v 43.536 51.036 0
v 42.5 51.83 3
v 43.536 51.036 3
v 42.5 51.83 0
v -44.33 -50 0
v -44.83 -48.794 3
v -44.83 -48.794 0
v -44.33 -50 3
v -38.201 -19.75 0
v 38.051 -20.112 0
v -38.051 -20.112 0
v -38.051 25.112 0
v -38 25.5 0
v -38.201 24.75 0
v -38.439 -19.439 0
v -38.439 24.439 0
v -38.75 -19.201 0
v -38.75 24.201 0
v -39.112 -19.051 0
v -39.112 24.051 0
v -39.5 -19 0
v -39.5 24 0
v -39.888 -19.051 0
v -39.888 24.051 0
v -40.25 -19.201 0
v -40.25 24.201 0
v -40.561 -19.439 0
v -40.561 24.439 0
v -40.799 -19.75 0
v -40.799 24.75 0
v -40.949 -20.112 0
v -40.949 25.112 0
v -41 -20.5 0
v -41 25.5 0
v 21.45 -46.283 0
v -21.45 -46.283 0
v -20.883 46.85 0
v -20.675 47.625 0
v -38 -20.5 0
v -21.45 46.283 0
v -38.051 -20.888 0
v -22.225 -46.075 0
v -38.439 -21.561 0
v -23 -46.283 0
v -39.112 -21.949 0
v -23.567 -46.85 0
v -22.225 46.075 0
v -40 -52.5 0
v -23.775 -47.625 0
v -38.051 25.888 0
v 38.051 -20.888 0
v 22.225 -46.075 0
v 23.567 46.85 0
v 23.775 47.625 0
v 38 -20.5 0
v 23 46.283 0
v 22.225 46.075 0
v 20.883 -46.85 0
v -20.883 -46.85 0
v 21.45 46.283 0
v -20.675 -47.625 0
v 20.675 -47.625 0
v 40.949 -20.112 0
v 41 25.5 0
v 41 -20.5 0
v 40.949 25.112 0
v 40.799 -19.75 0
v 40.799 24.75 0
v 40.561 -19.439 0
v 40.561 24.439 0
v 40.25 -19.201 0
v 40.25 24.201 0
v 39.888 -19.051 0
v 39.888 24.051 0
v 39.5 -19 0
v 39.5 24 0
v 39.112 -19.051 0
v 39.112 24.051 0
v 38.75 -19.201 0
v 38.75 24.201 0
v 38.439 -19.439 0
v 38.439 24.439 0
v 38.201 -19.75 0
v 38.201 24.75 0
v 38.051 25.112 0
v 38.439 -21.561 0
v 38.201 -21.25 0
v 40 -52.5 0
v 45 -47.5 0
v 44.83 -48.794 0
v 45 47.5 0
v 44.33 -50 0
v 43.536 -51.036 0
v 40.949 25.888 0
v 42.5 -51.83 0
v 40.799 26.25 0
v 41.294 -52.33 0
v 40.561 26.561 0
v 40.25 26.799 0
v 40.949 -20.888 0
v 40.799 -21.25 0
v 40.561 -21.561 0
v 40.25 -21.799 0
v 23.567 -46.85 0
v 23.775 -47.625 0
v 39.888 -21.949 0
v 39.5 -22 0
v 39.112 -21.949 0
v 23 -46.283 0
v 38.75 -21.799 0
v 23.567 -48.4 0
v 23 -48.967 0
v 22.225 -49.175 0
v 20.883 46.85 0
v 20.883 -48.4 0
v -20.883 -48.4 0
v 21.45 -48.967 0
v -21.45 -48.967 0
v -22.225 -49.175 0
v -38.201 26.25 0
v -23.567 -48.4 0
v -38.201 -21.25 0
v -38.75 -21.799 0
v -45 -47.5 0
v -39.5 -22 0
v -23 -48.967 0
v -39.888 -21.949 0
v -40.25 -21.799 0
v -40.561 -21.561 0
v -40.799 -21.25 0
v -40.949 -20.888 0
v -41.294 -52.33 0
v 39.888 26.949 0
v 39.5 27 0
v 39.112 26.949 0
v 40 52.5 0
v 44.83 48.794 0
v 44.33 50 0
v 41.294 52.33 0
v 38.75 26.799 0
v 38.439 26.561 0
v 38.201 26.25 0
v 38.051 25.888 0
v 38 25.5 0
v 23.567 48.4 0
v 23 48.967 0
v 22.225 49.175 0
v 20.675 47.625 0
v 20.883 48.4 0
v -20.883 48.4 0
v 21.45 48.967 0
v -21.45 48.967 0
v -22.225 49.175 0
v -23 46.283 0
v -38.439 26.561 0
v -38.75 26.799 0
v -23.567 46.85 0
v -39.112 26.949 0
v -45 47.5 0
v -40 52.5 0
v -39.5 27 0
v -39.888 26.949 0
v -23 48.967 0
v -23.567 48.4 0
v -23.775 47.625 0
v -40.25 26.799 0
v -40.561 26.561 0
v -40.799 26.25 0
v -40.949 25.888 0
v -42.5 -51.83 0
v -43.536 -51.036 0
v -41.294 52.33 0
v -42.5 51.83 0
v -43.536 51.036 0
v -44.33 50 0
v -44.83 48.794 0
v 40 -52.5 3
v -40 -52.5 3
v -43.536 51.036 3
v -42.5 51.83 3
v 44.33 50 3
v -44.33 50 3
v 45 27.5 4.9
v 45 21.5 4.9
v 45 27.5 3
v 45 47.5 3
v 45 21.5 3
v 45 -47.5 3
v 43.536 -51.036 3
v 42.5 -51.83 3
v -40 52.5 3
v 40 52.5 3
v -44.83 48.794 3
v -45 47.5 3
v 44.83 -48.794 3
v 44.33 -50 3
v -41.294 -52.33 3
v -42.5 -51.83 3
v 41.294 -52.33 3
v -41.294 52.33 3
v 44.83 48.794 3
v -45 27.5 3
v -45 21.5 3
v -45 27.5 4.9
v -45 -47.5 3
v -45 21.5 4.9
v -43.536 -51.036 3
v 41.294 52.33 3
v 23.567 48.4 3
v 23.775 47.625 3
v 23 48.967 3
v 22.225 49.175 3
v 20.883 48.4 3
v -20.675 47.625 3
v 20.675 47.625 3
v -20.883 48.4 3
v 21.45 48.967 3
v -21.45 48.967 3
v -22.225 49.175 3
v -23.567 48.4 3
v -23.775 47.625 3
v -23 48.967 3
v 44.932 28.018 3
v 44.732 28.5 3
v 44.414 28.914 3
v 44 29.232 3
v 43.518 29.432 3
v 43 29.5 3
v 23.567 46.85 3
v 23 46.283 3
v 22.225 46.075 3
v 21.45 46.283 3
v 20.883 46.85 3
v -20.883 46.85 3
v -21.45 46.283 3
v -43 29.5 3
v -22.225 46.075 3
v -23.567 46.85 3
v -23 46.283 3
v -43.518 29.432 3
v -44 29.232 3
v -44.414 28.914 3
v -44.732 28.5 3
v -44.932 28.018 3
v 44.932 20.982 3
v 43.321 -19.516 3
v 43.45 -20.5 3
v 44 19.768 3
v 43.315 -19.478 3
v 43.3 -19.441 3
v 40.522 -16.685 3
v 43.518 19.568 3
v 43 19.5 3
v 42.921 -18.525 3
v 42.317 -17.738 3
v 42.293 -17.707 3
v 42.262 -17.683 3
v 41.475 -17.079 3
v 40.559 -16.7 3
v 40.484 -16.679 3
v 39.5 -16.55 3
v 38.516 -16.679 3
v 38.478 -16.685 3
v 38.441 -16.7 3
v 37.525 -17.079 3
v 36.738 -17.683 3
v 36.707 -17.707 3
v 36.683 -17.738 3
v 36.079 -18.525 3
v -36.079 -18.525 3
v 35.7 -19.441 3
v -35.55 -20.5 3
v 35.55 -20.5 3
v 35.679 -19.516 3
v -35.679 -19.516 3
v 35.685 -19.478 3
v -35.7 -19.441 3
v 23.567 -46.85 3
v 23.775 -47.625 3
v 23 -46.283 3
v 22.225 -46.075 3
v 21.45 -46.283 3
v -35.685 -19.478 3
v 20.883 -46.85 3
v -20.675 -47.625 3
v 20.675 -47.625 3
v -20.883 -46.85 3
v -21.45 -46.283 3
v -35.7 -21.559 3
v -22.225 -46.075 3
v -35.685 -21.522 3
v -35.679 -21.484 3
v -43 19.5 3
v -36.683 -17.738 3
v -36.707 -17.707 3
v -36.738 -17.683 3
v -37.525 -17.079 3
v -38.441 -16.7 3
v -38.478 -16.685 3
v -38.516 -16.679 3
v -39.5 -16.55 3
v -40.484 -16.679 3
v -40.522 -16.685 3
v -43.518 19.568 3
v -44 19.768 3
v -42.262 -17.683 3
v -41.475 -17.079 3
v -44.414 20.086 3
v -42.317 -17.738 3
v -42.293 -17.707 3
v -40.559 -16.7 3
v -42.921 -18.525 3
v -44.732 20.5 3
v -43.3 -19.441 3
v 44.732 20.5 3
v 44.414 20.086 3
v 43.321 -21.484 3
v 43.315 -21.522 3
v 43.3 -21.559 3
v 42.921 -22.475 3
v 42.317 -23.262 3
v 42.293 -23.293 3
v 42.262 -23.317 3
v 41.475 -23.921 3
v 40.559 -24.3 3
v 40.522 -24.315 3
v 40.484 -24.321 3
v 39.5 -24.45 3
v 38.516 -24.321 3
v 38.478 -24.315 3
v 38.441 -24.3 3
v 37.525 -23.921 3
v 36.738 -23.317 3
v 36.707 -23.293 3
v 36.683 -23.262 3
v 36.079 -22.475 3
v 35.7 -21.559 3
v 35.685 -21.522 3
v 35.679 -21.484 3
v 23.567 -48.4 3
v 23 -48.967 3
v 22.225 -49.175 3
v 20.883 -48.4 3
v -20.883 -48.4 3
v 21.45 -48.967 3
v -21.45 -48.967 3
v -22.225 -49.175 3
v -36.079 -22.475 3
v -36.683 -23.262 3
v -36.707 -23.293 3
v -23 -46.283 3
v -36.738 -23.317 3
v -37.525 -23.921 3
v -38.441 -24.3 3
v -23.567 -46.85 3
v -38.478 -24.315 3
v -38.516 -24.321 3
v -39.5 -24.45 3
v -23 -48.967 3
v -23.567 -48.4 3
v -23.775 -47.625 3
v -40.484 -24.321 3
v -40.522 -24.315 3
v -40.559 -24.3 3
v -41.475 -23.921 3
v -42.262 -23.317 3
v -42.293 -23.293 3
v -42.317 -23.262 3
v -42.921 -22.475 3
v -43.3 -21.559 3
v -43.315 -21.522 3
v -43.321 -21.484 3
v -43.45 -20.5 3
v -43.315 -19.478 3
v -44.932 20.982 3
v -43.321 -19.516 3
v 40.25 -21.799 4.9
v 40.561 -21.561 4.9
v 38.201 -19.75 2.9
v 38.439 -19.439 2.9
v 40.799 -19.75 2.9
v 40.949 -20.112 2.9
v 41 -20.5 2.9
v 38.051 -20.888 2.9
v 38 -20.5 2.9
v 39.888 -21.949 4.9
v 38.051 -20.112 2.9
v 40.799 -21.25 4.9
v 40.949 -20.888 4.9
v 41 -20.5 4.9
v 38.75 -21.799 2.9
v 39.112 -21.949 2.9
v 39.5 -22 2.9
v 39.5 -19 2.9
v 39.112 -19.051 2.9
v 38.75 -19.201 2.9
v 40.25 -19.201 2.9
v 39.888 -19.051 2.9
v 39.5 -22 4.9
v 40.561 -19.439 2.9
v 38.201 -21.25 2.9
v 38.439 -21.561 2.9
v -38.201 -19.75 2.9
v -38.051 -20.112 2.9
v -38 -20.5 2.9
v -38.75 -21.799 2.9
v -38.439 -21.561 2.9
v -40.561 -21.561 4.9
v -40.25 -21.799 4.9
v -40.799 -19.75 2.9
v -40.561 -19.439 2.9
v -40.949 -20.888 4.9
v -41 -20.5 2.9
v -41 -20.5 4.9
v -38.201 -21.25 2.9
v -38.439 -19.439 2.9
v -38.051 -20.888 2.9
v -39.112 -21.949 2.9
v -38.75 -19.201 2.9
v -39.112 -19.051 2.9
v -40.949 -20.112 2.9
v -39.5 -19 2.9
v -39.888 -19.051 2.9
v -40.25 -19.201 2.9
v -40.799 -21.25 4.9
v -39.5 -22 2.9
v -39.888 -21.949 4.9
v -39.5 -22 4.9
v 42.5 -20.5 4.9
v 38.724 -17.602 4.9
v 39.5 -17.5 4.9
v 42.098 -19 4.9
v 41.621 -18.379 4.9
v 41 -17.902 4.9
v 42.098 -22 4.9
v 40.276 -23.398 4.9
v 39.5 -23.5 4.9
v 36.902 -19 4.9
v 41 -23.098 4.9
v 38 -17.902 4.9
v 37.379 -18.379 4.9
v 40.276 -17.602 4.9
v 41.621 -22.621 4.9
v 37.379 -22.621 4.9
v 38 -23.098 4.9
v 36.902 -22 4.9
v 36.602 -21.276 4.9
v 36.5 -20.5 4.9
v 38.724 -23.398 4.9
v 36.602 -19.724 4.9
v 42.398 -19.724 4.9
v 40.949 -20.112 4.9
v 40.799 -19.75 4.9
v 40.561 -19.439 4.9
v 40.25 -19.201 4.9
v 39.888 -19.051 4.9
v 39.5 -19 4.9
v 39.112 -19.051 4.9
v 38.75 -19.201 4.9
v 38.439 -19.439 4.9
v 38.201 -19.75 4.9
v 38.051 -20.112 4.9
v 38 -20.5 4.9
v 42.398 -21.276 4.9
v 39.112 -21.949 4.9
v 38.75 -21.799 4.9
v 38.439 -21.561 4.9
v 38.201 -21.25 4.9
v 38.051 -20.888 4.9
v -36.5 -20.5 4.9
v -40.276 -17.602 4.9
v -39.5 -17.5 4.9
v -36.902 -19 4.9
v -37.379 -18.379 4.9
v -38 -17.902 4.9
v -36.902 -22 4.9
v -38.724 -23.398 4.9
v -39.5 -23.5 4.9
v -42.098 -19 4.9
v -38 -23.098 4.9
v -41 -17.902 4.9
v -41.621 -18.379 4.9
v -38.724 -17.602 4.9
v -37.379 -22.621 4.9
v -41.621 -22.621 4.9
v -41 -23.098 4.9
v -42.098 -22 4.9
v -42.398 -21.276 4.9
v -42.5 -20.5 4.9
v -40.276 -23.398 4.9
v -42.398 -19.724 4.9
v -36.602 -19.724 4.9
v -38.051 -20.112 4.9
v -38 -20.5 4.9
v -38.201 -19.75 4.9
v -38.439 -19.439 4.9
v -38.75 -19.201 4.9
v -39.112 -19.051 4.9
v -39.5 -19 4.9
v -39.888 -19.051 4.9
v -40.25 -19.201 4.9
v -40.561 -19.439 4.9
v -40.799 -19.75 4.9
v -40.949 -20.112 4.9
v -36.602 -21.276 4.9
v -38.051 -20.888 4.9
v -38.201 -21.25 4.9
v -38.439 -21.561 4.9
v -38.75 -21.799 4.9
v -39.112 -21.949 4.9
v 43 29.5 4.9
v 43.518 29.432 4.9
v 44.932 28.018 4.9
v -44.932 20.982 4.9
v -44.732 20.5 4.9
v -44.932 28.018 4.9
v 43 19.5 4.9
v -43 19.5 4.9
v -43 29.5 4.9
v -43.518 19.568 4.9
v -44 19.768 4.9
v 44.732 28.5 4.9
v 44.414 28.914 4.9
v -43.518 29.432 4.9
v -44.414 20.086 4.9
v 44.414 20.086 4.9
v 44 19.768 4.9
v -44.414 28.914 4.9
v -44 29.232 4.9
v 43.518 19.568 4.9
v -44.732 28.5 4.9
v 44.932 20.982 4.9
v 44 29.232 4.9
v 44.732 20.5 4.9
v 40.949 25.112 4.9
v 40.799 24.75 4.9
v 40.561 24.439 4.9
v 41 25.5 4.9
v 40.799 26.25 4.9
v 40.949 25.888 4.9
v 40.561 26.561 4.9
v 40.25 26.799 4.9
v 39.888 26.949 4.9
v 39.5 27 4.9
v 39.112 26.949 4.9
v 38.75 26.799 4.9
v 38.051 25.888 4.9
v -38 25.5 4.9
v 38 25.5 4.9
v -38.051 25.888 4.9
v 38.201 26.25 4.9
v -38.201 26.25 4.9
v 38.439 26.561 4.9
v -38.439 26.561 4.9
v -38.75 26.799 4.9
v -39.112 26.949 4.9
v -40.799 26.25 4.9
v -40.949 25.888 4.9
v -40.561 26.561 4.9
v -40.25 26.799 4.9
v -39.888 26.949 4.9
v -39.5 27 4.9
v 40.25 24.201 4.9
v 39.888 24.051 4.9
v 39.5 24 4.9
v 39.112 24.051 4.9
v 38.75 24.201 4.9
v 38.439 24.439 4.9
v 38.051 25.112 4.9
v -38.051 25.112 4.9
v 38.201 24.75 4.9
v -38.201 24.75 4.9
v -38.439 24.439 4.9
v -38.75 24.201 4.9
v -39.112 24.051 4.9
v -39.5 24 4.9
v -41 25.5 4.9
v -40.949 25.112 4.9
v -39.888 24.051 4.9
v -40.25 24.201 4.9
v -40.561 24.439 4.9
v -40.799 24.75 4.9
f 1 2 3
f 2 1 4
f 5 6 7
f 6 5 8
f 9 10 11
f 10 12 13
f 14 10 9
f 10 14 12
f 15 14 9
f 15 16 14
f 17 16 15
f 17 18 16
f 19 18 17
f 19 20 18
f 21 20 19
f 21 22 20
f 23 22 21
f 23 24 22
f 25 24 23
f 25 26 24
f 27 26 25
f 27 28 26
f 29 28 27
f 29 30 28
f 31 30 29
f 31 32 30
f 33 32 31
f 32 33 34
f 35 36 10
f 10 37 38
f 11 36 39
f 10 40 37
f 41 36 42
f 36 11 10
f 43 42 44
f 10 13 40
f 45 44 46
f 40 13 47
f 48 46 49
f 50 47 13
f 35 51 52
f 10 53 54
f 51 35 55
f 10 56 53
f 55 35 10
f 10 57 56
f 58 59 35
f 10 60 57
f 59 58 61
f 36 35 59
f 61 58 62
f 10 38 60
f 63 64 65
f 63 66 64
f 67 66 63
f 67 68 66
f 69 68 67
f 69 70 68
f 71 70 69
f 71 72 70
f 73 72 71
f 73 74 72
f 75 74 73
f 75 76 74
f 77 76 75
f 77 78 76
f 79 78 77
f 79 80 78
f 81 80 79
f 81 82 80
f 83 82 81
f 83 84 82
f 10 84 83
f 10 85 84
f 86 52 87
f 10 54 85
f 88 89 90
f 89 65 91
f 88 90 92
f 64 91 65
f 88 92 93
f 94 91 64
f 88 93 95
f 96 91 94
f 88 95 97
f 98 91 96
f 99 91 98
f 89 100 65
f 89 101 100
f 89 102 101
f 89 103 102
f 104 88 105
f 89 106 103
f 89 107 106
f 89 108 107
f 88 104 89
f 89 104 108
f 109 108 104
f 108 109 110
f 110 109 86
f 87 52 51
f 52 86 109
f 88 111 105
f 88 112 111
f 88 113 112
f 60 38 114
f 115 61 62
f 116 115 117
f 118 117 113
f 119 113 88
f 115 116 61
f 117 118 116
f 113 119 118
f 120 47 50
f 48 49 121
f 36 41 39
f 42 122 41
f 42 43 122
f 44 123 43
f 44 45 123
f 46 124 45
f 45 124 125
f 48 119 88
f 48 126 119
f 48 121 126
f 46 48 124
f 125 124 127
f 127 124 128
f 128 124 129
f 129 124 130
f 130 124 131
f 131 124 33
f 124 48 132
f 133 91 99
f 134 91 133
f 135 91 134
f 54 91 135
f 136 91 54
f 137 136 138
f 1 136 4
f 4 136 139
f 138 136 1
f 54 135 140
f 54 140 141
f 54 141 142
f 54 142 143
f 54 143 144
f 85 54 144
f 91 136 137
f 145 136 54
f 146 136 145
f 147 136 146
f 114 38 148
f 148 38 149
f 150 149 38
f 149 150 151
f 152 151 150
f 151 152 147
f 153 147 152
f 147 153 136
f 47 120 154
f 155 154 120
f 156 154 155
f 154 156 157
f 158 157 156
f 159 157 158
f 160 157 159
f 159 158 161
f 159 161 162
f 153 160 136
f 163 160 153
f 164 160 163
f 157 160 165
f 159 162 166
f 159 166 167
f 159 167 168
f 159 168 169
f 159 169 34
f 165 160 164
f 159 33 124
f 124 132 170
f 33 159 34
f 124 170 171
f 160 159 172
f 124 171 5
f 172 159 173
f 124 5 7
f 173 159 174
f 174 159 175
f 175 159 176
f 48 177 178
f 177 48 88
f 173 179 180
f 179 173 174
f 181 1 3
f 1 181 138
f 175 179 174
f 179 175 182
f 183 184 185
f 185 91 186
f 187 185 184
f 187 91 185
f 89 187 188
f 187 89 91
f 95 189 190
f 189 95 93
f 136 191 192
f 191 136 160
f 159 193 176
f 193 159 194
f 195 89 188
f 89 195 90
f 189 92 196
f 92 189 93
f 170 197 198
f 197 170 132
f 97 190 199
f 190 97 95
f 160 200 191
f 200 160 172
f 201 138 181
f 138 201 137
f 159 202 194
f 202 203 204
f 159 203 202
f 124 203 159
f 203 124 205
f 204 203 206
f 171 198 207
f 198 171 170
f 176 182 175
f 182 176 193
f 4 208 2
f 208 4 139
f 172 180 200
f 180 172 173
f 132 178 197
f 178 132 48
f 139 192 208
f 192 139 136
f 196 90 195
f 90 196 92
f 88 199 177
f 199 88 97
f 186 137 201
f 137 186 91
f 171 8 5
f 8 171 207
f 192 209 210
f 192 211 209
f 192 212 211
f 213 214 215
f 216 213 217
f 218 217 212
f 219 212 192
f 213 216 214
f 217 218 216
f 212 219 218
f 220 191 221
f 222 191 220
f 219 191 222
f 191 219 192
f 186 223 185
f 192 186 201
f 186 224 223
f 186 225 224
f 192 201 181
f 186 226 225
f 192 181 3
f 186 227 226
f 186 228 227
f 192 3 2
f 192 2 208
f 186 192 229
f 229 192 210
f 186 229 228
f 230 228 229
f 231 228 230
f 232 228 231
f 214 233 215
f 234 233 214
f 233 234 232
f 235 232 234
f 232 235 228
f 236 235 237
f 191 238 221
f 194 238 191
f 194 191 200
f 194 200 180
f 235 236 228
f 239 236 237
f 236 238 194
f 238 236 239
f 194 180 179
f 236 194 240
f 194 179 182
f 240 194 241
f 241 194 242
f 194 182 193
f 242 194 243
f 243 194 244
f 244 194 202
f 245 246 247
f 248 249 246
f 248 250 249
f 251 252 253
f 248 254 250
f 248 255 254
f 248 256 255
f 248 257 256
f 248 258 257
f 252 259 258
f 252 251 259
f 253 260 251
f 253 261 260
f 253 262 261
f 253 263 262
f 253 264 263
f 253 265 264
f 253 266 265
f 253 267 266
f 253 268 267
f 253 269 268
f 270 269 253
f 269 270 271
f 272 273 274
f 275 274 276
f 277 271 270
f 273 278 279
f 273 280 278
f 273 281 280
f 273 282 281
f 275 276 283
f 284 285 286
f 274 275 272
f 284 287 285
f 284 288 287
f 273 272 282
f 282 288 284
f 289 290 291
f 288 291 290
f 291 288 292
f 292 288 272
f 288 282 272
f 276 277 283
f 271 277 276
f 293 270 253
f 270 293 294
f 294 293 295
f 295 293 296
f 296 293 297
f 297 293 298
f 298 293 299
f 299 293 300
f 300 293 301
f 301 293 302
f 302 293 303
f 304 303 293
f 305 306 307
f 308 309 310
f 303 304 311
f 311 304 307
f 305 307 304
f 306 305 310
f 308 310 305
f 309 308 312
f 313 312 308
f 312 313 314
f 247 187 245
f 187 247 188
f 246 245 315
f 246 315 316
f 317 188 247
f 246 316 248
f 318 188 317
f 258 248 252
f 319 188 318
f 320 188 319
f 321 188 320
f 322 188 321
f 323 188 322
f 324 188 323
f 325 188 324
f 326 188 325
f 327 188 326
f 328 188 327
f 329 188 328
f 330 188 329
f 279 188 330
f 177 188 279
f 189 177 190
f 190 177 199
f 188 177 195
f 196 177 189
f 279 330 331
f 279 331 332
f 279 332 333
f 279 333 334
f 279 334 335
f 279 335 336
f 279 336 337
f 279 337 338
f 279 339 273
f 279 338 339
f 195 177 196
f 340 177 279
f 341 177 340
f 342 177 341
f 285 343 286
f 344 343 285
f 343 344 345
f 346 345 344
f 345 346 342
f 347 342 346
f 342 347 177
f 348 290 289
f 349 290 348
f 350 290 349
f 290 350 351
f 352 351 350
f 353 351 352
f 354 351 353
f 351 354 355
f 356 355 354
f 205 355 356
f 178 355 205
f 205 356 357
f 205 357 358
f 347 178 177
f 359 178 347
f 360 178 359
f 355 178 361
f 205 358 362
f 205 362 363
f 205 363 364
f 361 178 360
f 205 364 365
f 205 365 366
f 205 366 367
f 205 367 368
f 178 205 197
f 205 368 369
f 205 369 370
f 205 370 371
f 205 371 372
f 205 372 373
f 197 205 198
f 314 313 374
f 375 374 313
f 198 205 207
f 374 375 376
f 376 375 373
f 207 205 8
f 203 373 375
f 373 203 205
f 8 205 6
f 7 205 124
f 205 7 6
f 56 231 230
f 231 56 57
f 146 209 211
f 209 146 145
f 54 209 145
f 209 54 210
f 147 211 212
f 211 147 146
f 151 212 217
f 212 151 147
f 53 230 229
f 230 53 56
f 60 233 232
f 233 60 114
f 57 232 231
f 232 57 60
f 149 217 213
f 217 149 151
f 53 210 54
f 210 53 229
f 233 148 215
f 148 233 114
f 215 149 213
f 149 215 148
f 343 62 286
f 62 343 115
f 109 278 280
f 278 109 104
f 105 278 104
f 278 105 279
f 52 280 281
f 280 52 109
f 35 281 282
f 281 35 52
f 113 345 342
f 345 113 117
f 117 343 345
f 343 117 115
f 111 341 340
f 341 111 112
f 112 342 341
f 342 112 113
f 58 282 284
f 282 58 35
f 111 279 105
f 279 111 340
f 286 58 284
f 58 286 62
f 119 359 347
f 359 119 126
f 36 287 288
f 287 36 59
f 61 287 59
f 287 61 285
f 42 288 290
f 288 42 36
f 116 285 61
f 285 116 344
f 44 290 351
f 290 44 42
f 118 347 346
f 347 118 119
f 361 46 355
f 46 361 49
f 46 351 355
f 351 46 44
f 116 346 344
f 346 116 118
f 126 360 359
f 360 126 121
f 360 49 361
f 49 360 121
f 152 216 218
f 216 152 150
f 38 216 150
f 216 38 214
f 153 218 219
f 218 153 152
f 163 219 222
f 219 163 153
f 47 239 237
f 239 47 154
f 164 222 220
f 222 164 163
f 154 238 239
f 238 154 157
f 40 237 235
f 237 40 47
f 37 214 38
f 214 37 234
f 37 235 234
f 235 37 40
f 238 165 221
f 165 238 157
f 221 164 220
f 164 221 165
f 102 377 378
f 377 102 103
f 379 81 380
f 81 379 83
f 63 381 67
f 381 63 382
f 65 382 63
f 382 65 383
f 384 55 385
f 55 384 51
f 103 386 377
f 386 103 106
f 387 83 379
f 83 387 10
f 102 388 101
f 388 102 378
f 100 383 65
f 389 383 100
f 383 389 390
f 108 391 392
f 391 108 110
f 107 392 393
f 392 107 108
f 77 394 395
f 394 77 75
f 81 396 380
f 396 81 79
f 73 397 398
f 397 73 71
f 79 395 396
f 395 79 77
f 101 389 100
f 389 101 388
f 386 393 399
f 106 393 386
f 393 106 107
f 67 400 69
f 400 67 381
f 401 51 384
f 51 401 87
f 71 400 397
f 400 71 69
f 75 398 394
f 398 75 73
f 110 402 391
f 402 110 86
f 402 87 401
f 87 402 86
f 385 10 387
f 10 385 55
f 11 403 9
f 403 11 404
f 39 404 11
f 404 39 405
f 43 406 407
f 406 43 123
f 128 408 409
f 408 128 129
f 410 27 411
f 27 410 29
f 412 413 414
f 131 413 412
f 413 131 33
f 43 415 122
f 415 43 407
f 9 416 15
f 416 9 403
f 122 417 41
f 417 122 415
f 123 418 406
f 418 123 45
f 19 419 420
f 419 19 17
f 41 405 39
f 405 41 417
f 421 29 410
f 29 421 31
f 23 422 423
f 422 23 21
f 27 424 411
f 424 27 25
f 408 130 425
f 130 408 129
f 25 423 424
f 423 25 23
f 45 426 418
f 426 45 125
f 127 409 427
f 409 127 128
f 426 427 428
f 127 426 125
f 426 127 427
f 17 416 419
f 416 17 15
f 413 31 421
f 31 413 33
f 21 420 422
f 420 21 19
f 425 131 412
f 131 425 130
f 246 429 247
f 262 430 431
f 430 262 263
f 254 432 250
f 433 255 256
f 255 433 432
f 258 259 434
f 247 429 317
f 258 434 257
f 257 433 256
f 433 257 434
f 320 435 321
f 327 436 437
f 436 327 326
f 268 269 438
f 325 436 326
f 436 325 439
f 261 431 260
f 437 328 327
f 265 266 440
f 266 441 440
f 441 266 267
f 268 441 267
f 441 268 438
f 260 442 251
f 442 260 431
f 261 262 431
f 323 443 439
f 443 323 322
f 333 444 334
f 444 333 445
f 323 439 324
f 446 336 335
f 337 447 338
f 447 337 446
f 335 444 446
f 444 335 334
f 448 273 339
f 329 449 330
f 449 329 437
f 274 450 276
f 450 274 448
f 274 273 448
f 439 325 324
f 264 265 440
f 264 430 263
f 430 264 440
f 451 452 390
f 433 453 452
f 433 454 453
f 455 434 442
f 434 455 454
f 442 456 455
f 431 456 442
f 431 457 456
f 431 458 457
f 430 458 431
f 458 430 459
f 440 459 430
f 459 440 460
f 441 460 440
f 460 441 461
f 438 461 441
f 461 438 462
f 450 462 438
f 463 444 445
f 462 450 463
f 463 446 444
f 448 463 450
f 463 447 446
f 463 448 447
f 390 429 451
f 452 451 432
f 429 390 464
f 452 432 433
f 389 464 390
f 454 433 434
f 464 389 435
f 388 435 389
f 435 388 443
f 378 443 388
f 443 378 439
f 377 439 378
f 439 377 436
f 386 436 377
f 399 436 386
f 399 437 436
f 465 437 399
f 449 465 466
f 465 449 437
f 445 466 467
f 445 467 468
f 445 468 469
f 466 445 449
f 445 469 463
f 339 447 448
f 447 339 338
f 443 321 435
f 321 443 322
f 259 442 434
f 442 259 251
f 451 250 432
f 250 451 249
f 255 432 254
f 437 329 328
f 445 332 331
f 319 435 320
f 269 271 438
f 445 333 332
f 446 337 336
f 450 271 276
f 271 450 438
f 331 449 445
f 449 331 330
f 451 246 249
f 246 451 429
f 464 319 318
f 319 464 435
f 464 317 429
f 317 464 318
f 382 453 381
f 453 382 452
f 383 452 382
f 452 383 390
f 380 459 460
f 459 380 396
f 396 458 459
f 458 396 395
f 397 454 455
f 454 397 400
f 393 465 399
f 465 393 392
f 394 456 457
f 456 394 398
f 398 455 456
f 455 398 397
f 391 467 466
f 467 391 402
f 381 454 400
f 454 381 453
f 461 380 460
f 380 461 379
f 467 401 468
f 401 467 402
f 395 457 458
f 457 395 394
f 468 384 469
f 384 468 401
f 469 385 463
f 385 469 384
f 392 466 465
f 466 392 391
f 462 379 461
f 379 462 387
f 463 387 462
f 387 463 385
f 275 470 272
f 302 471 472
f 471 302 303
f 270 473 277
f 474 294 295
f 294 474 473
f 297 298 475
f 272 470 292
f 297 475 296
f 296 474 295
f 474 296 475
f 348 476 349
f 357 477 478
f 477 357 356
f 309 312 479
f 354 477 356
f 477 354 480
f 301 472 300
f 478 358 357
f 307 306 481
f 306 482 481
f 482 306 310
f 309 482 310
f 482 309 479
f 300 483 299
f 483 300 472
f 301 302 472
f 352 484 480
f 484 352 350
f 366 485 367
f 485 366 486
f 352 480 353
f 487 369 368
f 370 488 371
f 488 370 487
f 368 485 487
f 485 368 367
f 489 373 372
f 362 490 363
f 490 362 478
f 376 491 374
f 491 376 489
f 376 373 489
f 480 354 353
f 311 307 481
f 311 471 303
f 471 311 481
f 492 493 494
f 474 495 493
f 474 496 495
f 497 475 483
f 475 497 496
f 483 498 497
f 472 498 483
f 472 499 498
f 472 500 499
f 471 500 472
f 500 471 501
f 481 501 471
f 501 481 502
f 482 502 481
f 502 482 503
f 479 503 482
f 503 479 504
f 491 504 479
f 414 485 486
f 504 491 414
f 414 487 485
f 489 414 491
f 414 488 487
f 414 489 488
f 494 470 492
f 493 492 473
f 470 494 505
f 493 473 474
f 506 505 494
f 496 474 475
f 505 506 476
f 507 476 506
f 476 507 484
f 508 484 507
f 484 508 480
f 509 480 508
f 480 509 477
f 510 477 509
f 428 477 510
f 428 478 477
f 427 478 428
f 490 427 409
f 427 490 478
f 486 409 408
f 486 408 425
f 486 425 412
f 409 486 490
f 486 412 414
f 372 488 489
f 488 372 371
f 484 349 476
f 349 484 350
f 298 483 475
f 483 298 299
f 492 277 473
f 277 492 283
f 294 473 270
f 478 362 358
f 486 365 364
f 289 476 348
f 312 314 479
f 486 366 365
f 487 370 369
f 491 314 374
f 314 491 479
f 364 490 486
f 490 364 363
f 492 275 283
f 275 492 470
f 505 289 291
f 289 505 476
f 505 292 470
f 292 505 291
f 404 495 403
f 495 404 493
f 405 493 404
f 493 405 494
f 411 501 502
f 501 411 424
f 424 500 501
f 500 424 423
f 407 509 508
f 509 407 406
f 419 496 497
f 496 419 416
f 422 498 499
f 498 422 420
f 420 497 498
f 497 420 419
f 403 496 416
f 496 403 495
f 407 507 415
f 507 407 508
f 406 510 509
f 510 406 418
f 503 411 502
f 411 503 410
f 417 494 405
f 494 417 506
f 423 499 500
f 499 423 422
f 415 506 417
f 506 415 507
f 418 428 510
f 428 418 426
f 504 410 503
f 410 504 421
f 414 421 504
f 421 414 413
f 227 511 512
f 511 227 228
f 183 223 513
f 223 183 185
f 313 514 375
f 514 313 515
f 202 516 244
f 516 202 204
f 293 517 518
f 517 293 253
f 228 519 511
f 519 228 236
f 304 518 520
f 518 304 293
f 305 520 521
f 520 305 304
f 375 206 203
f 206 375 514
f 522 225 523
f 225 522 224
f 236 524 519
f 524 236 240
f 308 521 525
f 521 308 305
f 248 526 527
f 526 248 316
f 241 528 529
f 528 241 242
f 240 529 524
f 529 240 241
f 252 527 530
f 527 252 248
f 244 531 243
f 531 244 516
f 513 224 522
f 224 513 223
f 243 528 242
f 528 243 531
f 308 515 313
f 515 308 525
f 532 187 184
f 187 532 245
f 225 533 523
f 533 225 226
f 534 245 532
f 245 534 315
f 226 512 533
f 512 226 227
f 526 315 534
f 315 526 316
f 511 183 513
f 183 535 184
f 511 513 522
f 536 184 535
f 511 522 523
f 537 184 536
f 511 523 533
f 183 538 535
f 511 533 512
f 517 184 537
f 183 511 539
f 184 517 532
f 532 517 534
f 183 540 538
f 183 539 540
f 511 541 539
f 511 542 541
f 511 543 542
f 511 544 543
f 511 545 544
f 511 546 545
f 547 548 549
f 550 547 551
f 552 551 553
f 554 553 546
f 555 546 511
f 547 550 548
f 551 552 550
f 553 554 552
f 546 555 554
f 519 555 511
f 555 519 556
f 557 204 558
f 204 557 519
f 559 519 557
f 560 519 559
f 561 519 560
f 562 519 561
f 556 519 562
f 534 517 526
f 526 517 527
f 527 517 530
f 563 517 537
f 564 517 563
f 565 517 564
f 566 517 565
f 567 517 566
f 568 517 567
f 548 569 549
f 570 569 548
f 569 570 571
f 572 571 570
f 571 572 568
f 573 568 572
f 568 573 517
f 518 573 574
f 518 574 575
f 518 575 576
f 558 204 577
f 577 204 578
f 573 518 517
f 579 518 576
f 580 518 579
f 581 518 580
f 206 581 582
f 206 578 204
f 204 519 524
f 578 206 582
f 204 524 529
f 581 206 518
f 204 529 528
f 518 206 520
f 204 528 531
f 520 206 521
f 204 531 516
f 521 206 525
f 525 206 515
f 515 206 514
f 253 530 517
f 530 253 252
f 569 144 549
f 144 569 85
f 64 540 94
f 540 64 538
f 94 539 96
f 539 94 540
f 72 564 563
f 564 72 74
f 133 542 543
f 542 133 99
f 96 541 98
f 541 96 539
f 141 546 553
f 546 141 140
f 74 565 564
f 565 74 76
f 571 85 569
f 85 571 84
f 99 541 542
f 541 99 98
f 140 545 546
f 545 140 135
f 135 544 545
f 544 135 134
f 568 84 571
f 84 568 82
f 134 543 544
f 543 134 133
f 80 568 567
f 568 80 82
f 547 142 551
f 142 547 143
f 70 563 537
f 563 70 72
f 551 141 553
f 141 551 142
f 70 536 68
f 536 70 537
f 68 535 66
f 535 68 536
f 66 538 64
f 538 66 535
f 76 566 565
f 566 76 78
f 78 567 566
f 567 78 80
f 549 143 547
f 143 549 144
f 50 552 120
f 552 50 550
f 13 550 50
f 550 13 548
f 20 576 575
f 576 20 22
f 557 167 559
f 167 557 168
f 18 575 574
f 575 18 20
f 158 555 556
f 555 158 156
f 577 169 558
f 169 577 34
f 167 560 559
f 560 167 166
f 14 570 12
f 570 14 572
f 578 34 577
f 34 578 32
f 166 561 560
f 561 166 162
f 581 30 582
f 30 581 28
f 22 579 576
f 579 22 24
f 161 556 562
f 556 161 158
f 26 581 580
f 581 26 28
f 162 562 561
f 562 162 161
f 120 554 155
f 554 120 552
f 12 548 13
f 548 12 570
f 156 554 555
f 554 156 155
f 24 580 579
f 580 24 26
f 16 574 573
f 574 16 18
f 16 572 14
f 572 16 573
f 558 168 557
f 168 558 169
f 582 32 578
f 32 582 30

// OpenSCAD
// file: ../OpenSCAD_Modules/stand.scad
module stand(
height=3,
inner_diam=3,
top_diam=5,
bottom_diam=7,
center_xy=false,
attach=0,
quality=0, //0 and up, 0 - use $fn
)
{
	assert(height>0)
	assert(inner_diam>0)
	assert(top_diam>0)
	assert(bottom_diam>0)
	assert(attach>=0)
	assert(inner_diam<top_diam)
	assert(bottom_diam>top_diam)
	assert(quality>=0);
	fn=quality>0?8*quality:$fn;
	translate([center_xy?0:bottom_diam/2,center_xy?0:bottom_diam/2,-attach])
	difference()
	{
			cylinder(h=height+attach,d1=bottom_diam,d2=top_diam,$fn=fn);
			cylinder(h=(height+attach)*3,d=inner_diam,center=true,$fn=fn);
	}
}

//stand();
//stand(height=2,attach=0.05,$fn=4);
//stand(height=2,attach=0.05,$fn=8);
//stand(height=2,attach=0.05,quality=1);
stand(height=2,attach=0.1,quality=2,center_xy=true);
// file: ../OpenSCAD_Modules/cube_vround.scad
module cube_vround(
	size=[10,10,10],
	round_corners=[true,true,true,true],
	rounding=3,
	center_xy=false,
	center_z=false,
	attach=0,
	wall_attach=0,
	quality=2, //integer from 1 to infinity
)
{
	assert(len(size)==3);
	assert(len(round_corners)==4);
	assert(rounding>0);
	assert(rounding<=size[0]/2);
	assert(rounding<=size[1]/2);
	assert(quality>0);
	assert(attach>=0);
	assert(wall_attach>=0);
	height=size[2]+attach;
	cyl_r=rounding+wall_attach;
	cyl_mvx=size[0]/2-rounding;
	cyl_mvy=size[1]/2-rounding;
	cube_szx=size[0]/2;
	cube_szy=size[1]/2;
	cube_mvx=cube_szx/2+wall_attach;
	cube_mvy=cube_szy/2+wall_attach;
	translate([center_xy?0:cube_szx,center_xy?0:cube_szy,center_z?-attach/2:(size[2]-attach)/2])
		hull()
		{
			if(round_corners[0])
				translate([cyl_mvx,cyl_mvy])
					cylinder(r=cyl_r,h=height,$fn=12*quality,center=true);
			else
				translate([cube_mvx,cube_mvy])
					cube([cube_szx,cube_szy,height],center=true);
			if(round_corners[1])
				translate([cyl_mvx,-cyl_mvy])
					cylinder(r=cyl_r,h=height,$fn=12*quality,center=true);
			else
				translate([cube_mvx,-cube_mvy])
					cube([cube_szx,cube_szy,height],center=true);
			if(round_corners[2])
				translate([-cyl_mvx,-cyl_mvy])
					cylinder(r=cyl_r,h=height,$fn=12*quality,center=true);
			else
				translate([-cube_mvx,-cube_mvy])
					cube([cube_szx,cube_szy,height],center=true);
			if(round_corners[3])
				translate([-cyl_mvx,cyl_mvy])
					cylinder(r=cyl_r,h=height,$fn=12*quality,center=true);
			else
				translate([-cube_mvx,cube_mvy])
					cube([cube_szx,cube_szy,height],center=true);
		};
}

//example
cube_vround(round_corners=[true,false,true,false],
size=[10,20,6],
attach=0.1,
wall_attach=0.1,
rounding=3,
center_xy=true,center_z=false);
// main file
use <../OpenSCAD_Modules/cube_vround.scad>
use <../OpenSCAD_Modules/stand.scad>

module adapter()
{
	// http://support.wdc.com/images/kb/3_5_emount.jpg
	adapter_szx=90;
	holes_szx=44.45;
	holes_szy=95.25;
	adapter_holes_szx=79;
	bracket_sz=10;
	ngff_szx=41;
	difference()
	{
		union()
		{
			difference()
			{
				//base
				cube_vround(size=[adapter_szx,105,3], round_corners=[true,true,true,true],
				rounding=5, center_xy=true, center_z=false, attach=0, wall_attach=0, quality=2);
				//hdd cliping holes
				translate([holes_szx/2,holes_szy/2,0])
					cylinder(d=3.1,h=6.1,center=true,$fn=12);
				translate([holes_szx/2,-holes_szy/2,0])
					cylinder(d=3.1,h=6.1,center=true,$fn=12);
				translate(-[holes_szx/2,holes_szy/2,0])
					cylinder(d=3.1,h=6.1,center=true,$fn=12);
				translate(-[holes_szx/2,-holes_szy/2,0])
					cylinder(d=3.1,h=6.1,center=true,$fn=12);
				//ngff adapter mount holes 
				translate([adapter_holes_szx/2,-ngff_szx/2,0])
					cylinder(d=3,h=6.1,center=true,$fn=24);
				translate([-adapter_holes_szx/2,-ngff_szx/2,0])
					cylinder(d=3,h=6.1,center=true,$fn=24);
			}
			//ngff stands
			translate([adapter_holes_szx/2,-ngff_szx/2,2.9])
				stand(height=2, inner_diam=3, top_diam=6, bottom_diam=8, center_xy=true, attach=0, quality=3);
			translate([-adapter_holes_szx/2,-ngff_szx/2,2.9])
				stand(height=2, inner_diam=3, top_diam=6, bottom_diam=8, center_xy=true, attach=0, quality=3);
			//ngff bracket
			translate([0,bracket_sz/2+ngff_szx/2-1,2.9])
				cube_vround(size=[adapter_szx,bracket_sz,2], round_corners=[true,true,true,true],
				rounding=2, center_xy=true, center_z=false, attach=0, wall_attach=0, quality=2);
		}
		//ngff bracket mount holes
		translate([adapter_holes_szx/2,bracket_sz/2+ngff_szx/2,0])
			cylinder(d=3,h=30,center=true,$fn=24);
		translate([-adapter_holes_szx/2,bracket_sz/2+ngff_szx/2,0])
			cylinder(d=3,h=30,center=true,$fn=24);
	}
}


adapter();
